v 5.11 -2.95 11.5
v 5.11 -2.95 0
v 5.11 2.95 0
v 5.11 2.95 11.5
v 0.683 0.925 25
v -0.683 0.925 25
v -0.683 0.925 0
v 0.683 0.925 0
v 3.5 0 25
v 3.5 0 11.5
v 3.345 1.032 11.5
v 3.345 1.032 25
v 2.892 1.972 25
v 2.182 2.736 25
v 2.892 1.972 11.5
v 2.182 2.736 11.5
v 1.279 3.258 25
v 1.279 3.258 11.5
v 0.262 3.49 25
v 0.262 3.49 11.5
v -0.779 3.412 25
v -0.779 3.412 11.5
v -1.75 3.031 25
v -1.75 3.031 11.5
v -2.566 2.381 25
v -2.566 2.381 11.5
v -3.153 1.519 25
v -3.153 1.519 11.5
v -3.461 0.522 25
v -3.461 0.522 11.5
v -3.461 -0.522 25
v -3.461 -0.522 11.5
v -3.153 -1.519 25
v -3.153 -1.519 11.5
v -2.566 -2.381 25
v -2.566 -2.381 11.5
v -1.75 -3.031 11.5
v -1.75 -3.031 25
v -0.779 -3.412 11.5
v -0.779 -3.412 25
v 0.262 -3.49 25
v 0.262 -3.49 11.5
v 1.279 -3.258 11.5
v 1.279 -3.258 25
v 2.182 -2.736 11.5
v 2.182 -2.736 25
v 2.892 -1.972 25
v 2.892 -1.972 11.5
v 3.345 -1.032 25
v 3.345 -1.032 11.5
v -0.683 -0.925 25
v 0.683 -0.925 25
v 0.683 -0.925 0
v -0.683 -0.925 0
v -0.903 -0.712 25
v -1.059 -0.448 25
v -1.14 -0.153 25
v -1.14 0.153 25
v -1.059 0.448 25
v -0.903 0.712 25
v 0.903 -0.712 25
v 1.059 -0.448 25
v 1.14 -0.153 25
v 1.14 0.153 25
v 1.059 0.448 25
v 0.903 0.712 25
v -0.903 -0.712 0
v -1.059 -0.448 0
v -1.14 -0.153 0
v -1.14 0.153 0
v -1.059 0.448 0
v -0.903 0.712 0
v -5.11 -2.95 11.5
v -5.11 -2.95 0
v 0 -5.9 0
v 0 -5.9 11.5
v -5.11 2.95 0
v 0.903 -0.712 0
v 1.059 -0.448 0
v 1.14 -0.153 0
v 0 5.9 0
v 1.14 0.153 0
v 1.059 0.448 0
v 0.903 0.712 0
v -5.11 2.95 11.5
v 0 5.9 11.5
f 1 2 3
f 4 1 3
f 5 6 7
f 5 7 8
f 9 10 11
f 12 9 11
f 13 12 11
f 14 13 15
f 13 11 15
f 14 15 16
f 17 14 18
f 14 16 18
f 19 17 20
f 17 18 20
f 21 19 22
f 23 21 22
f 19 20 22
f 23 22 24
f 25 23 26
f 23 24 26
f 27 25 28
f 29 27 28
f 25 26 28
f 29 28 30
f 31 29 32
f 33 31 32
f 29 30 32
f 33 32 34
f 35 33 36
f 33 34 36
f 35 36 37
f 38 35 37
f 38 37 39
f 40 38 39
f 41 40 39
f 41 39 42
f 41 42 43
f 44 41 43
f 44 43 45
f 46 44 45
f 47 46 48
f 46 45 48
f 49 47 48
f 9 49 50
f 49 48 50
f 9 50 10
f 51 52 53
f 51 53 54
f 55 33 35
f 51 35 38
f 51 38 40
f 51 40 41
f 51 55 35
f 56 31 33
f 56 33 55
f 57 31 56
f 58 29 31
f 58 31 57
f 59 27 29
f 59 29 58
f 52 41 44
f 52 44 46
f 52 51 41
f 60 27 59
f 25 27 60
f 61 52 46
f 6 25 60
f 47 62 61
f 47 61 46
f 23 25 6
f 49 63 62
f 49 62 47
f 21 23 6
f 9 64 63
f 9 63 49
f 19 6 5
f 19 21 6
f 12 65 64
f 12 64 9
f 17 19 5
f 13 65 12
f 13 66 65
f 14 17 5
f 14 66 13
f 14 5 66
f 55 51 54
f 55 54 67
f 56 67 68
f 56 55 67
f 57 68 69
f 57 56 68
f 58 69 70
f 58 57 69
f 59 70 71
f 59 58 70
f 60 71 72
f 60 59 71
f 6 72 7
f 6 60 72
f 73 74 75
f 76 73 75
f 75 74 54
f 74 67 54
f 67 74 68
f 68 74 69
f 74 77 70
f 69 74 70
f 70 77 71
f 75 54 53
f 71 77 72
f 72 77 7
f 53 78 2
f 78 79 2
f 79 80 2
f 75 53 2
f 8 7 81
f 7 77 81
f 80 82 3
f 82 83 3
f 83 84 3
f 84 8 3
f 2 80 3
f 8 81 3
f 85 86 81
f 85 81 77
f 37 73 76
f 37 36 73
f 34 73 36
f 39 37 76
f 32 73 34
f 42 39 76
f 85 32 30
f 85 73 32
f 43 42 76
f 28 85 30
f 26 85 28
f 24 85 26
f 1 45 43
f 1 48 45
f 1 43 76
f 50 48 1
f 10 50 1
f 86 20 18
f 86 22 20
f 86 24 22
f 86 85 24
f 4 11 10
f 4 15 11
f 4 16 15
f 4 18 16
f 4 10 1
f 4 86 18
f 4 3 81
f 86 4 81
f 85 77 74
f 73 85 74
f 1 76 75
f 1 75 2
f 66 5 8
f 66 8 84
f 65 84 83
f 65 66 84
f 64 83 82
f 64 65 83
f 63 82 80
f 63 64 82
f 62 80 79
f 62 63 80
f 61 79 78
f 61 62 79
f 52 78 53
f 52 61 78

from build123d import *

# Parameters (mm, degrees)
BOSS_EXTRUDE1_DEPTH = 11.5
SKETCH2_R           = 3.5
BOSS_EXTRUDE2_DEPTH = 13.5
CUT_EXTRUDE2_DEPTH  = 27.190026728


with BuildPart() as part:
    # Sketch1 → Boss-Extrude1 (new body)
    with BuildSketch(Plane.XY):
        Polygon((5.109549882, -2.95), (5.109549882, 2.95), (0, 5.9), (-5.109549882, 2.95), (-5.109549882, -2.95), (0, -5.9), align=None)
    extrude(amount=BOSS_EXTRUDE1_DEPTH)

    # Sketch2 → Boss-Extrude2 (add)
    with BuildSketch(Plane.XY.offset(11.5)):
        Circle(SKETCH2_R)
    extrude(amount=BOSS_EXTRUDE2_DEPTH)

    # Sketch4 → Cut-Extrude2 (cut, through all)
    with BuildSketch(Plane.XY.offset(25)):
        with BuildLine():
            Line((-0.683282518, 0.925), (0.683282518, 0.925))
            ThreePointArc((0.683282518, 0.925), (1.15, 0), (0.683282518, -0.925))
            Line((0.683282518, -0.925), (-0.683282518, -0.925))
            ThreePointArc((-0.683282518, -0.925), (-1.15, 0), (-0.683282518, 0.925))
        make_face()
    extrude(amount=-CUT_EXTRUDE2_DEPTH, mode=Mode.SUBTRACT)


solid = part.part
